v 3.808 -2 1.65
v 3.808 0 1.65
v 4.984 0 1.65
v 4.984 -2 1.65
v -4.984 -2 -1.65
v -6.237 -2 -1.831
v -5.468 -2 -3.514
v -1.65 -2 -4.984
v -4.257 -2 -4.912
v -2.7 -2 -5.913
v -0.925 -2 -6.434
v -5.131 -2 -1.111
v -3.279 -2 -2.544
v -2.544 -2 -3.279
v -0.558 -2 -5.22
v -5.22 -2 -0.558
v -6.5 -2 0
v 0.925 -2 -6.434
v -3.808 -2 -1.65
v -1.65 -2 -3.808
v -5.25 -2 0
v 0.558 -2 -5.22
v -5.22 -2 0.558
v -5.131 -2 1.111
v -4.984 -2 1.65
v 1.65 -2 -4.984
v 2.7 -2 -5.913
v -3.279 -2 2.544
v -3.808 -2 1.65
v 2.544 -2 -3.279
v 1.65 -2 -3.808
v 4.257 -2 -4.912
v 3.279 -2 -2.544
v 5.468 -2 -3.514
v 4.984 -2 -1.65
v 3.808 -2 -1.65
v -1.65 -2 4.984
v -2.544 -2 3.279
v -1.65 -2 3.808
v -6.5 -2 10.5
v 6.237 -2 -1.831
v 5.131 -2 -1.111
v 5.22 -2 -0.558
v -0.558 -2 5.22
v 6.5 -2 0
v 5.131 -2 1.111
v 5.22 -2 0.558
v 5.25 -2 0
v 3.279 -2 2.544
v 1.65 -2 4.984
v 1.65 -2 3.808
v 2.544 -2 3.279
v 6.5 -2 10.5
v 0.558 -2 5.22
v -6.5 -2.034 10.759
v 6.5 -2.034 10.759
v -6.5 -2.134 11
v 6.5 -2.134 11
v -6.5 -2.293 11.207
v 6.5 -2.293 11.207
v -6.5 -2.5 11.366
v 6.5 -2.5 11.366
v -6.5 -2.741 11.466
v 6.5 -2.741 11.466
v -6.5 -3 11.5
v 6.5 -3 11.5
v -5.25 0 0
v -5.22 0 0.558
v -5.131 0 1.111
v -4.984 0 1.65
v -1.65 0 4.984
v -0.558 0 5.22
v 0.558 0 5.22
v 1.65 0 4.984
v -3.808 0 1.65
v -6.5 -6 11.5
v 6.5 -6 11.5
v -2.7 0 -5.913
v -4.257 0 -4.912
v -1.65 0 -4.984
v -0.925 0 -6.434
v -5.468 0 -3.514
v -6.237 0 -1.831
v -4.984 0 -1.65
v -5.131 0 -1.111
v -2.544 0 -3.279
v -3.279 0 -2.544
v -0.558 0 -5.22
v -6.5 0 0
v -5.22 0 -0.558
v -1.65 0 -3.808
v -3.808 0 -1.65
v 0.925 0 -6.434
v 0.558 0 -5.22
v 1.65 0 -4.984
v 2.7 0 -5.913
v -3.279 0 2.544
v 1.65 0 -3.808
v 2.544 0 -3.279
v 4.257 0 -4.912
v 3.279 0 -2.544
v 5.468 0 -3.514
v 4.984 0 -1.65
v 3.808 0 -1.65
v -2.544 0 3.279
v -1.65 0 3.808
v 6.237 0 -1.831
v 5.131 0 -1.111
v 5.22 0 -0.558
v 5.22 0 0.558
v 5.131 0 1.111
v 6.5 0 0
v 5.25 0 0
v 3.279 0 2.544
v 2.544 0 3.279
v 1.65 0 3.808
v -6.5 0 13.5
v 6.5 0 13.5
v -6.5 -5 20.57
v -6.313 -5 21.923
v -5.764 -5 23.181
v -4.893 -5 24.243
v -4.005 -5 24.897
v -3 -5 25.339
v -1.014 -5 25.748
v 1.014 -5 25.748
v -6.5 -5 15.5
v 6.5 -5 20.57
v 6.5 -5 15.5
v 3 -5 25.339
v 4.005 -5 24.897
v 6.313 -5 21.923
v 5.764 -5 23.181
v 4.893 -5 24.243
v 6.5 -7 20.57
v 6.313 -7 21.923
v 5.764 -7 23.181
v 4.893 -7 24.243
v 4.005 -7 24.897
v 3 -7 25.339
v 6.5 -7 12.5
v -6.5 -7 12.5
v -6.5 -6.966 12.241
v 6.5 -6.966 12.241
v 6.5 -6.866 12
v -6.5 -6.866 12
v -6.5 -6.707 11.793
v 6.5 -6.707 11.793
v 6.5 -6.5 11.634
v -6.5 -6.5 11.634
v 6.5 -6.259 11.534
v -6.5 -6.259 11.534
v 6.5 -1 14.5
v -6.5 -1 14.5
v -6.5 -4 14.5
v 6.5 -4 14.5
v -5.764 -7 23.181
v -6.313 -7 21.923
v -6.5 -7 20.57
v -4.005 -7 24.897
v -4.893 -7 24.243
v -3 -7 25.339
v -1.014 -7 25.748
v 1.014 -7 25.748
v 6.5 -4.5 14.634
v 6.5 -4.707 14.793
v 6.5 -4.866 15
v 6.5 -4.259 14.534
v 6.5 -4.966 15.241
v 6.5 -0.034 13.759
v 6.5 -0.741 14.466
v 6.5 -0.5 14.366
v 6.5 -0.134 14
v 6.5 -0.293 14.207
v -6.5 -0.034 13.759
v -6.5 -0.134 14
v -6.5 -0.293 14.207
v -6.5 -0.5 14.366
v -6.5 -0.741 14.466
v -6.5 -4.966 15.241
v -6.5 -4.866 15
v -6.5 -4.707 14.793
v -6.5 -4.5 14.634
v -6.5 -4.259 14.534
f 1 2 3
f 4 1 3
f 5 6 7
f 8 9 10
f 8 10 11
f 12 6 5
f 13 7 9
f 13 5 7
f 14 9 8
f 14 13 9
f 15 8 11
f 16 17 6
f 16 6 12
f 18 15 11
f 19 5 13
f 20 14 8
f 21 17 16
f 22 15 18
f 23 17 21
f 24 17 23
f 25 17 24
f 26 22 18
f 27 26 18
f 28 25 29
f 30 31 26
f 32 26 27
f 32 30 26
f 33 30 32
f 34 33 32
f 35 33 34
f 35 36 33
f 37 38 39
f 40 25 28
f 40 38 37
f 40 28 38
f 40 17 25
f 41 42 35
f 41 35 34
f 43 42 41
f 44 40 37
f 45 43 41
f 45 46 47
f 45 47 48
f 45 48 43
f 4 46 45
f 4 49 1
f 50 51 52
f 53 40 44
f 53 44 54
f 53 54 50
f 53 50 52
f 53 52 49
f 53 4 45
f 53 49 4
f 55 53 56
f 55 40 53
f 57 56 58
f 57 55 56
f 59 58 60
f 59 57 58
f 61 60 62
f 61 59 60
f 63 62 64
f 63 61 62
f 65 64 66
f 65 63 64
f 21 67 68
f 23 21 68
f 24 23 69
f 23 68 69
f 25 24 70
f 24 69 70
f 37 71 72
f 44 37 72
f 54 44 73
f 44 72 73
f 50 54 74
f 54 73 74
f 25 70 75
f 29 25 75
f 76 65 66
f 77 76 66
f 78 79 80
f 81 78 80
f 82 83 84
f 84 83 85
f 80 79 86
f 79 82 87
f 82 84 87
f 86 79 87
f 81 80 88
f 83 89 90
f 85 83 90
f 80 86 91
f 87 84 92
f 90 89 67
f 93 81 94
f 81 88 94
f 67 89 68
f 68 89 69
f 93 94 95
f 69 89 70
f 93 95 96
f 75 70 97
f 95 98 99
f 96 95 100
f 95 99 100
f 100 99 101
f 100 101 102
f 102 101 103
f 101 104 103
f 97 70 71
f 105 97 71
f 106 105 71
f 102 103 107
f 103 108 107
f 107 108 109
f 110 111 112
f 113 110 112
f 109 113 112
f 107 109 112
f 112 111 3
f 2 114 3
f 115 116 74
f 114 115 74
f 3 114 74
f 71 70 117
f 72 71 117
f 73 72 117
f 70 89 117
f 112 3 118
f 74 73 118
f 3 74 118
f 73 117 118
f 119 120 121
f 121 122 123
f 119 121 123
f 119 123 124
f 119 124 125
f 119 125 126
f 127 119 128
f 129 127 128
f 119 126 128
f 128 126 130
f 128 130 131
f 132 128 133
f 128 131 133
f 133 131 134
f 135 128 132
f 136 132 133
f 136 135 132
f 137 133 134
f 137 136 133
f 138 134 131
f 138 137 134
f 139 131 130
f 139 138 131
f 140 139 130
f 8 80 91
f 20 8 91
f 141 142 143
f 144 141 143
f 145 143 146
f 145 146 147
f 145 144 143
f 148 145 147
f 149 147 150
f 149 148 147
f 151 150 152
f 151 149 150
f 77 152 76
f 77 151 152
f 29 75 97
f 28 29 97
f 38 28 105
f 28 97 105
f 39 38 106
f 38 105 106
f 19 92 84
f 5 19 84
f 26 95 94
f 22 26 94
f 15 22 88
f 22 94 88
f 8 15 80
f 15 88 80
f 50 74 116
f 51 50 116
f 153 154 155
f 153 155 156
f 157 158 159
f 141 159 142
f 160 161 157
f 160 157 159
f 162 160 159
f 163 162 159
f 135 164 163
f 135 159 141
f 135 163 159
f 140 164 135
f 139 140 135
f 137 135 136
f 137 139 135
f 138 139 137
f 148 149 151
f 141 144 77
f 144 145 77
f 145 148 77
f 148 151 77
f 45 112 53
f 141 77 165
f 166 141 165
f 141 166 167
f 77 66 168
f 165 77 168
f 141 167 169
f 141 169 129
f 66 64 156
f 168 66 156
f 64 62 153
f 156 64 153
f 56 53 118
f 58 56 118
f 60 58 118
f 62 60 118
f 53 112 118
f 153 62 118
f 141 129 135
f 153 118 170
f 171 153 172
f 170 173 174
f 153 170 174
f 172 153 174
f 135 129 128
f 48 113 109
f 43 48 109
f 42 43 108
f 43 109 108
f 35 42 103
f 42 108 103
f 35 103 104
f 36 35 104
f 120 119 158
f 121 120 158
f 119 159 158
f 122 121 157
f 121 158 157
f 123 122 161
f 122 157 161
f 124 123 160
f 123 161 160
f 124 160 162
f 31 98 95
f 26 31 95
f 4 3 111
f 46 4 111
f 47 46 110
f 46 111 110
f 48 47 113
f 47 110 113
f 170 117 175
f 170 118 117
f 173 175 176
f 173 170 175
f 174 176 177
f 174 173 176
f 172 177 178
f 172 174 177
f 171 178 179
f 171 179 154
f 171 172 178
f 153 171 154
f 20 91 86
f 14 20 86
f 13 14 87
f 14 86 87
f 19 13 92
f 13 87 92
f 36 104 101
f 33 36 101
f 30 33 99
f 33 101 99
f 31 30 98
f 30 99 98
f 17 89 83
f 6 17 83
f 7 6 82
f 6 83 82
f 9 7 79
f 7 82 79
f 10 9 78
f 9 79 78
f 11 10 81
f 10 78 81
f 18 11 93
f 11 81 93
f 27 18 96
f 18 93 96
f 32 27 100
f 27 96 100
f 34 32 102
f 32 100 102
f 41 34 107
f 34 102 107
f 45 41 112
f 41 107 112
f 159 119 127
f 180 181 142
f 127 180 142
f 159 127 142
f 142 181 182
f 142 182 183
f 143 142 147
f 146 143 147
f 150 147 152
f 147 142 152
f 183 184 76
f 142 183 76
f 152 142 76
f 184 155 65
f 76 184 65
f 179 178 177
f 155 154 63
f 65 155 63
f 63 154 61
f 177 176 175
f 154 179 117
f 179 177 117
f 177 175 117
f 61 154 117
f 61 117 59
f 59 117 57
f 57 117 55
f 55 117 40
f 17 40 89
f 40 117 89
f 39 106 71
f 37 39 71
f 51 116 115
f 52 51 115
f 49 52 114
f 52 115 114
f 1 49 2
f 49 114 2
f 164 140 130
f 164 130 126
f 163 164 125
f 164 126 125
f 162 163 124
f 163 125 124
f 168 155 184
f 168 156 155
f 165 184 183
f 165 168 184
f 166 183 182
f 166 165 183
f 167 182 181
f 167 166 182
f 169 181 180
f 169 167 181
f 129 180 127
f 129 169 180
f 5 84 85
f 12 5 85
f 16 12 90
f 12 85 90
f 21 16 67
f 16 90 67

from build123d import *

# Parameters (mm, degrees)
F1_DEPTH = 2
F0_W     = 13
F0_H     = 3
F2_DEPTH = 7
F3_START = 5
F3_DEPTH = 2
F4_R     = 1
F5_R     = 5


with BuildPart() as f1:
    # F0 (on Front) → F1 (new body)
    with BuildSketch(Plane.XZ):
        with BuildLine():
            Line((3.8078865529, 1.65), (4.9839743178, 1.65))
            ThreePointArc((4.9839743178, 1.65), (3.7123106012, 3.7123106012), (1.65, 4.9839743178))
            Line((1.65, 4.9839743178), (1.65, 3.8078865529))
            ThreePointArc((1.65, 3.8078865529), (2.9344931419, 2.9344931419), (3.8078865529, 1.65))
        make_face()
        with BuildLine():
            ThreePointArc((-1.65, 4.9839743178), (-3.7123106012, 3.7123106012), (-4.9839743178, 1.65))
            Line((-4.9839743178, 1.65), (-3.8078865529, 1.65))
            ThreePointArc((-3.8078865529, 1.65), (-2.9344931419, 2.9344931419), (-1.65, 3.8078865529))
            Line((-1.65, 3.8078865529), (-1.65, 4.9839743178))
        make_face()
        with BuildLine():
            Line((-3.8078865529, -1.65), (-4.9839743178, -1.65))
            ThreePointArc((-4.9839743178, -1.65), (-3.7123106012, -3.7123106012), (-1.65, -4.9839743178))
            Line((-1.65, -4.9839743178), (-1.65, -3.8078865529))
            ThreePointArc((-1.65, -3.8078865529), (-2.9344931419, -2.9344931419), (-3.8078865529, -1.65))
        make_face()
        with BuildLine():
            ThreePointArc((1.65, -4.9839743178), (3.7123106012, -3.7123106012), (4.9839743178, -1.65))
            Line((4.9839743178, -1.65), (3.8078865529, -1.65))
            ThreePointArc((3.8078865529, -1.65), (2.9344931419, -2.9344931419), (1.65, -3.8078865529))
            Line((1.65, -3.8078865529), (1.65, -4.9839743178))
        make_face()
        with BuildLine():
            Line((-5.25, 0), (-6.5, 0))
            ThreePointArc((-6.5, 0), (0, -6.5), (6.5, 0))
            Line((6.5, 0), (5.25, 0))
            ThreePointArc((5.25, 0), (5.1830669091, -0.8356538852), (4.9839743178, -1.65))
            ThreePointArc((4.9839743178, -1.65), (3.7123106012, -3.7123106012), (1.65, -4.9839743178))
            ThreePointArc((1.65, -4.9839743178), (0, -5.25), (-1.65, -4.9839743178))
            ThreePointArc((-1.65, -4.9839743178), (-3.7123106012, -3.7123106012), (-4.9839743178, -1.65))
            ThreePointArc((-4.9839743178, -1.65), (-5.1830669091, -0.8356538852), (-5.25, 0))
        make_face()
        with BuildLine():
            ThreePointArc((-2.3184322471, 6.0724683544), (-5.3534946346, 3.6864746299), (-6.5, 0))
            Line((-6.5, 0), (-5.25, 0))
            ThreePointArc((-5.25, 0), (-5.1830669091, 0.8356538852), (-4.9839743178, 1.65))
            ThreePointArc((-4.9839743178, 1.65), (-3.7123106012, 3.7123106012), (-1.65, 4.9839743178))
            ThreePointArc((-1.65, 4.9839743178), (0, 5.25), (1.65, 4.9839743178))
            ThreePointArc((1.65, 4.9839743178), (3.7123106012, 3.7123106012), (4.9839743178, 1.65))
            ThreePointArc((4.9839743178, 1.65), (5.1830669091, 0.8356538852), (5.25, 0))
            Line((5.25, 0), (6.5, 0))
            ThreePointArc((6.5, 0), (5.3534946346, 3.6864746299), (2.3184322471, 6.0724683544))
            ThreePointArc((2.3184322471, 6.0724683544), (0, 5.8), (-2.3184322471, 6.0724683544))
        make_face()
        with BuildLine():
            ThreePointArc((2.3184322471, 6.0724683544), (0, 6.5), (-2.3184322471, 6.0724683544))
            ThreePointArc((-2.3184322471, 6.0724683544), (0, 5.8), (2.3184322471, 6.0724683544))
        make_face()
        with BuildLine():
            Line((-6.5, 8.2006579232), (-6.5, 0))
            ThreePointArc((-6.5, 0), (-5.3534946346, 3.6864746299), (-2.3184322471, 6.0724683544))
            ThreePointArc((-2.3184322471, 6.0724683544), (-4.5358003191, 6.8878445107), (-6.5, 8.2006579232))
        make_face()
        with BuildLine():
            ThreePointArc((2.3184322471, 6.0724683544), (5.3534946346, 3.6864746299), (6.5, 0))
            Line((6.5, 0), (6.5, 8.2006579232))
            ThreePointArc((6.5, 8.2006579232), (4.5358003191, 6.8878445107), (2.3184322471, 6.0724683544))
        make_face()
        with BuildLine():
            ThreePointArc((-6.5, 8.2006579232), (-4.5358003191, 6.8878445107), (-2.3184322471, 6.0724683544))
            ThreePointArc((-2.3184322471, 6.0724683544), (0, 6.5), (2.3184322471, 6.0724683544))
            ThreePointArc((2.3184322471, 6.0724683544), (4.5358003191, 6.8878445107), (6.5, 8.2006579232))
            Line((6.5, 8.2006579232), (6.5, 11.5))
            Line((6.5, 11.5), (-6.5, 11.5))
            Line((-6.5, 11.5), (-6.5, 8.2006579232))
        make_face()
    extrude(amount=F1_DEPTH)

    # F0 (on Front) → F2 (join)
    with BuildSketch(Plane.XZ):
        with Locations((0, 13)):
            Rectangle(F0_W, F0_H)
    extrude(amount=F2_DEPTH)

    # F0 (on Front) → F3 (join)
    with BuildSketch(Plane.XZ.offset(F3_START)):
        with BuildLine():
            ThreePointArc((-6.3804388564, 23.5), (-6.4404160803, 23.4499046211), (-6.5, 23.3993420768))
            Line((-6.5, 23.3993420768), (-6.5, 14.5))
            Line((-6.5, 14.5), (6.5, 14.5))
            Line((6.5, 14.5), (6.5, 23.3993420768))
            ThreePointArc((6.5, 23.3993420768), (6.4404160803, 23.4499046211), (6.3804388564, 23.5))
            Line((6.3804388564, 23.5), (-6.3804388564, 23.5))
        make_face()
        with BuildLine():
            ThreePointArc((6.3804388564, 23.5), (0, 25.8), (-6.3804388564, 23.5))
            Line((-6.3804388564, 23.5), (6.3804388564, 23.5))
        make_face()
    extrude(amount=F3_DEPTH)

    # F4
    f4_edges = [f1.edges().sort_by_distance(p)[0] for p in [
        (0, -2, 11.5),
        (0, -7, 11.5),
        (0, 0, 14.5),
        (0, -5, 14.5),
    ]]
    fillet(f4_edges, radius=F4_R)

    # F5
    f5_edges = [f1.edges().sort_by_distance(p)[0] for p in [
        (6.5, -6, 23.399342),
        (-6.5, -6, 23.399342),
    ]]
    fillet(f5_edges, radius=F5_R)


solid = f1.part
